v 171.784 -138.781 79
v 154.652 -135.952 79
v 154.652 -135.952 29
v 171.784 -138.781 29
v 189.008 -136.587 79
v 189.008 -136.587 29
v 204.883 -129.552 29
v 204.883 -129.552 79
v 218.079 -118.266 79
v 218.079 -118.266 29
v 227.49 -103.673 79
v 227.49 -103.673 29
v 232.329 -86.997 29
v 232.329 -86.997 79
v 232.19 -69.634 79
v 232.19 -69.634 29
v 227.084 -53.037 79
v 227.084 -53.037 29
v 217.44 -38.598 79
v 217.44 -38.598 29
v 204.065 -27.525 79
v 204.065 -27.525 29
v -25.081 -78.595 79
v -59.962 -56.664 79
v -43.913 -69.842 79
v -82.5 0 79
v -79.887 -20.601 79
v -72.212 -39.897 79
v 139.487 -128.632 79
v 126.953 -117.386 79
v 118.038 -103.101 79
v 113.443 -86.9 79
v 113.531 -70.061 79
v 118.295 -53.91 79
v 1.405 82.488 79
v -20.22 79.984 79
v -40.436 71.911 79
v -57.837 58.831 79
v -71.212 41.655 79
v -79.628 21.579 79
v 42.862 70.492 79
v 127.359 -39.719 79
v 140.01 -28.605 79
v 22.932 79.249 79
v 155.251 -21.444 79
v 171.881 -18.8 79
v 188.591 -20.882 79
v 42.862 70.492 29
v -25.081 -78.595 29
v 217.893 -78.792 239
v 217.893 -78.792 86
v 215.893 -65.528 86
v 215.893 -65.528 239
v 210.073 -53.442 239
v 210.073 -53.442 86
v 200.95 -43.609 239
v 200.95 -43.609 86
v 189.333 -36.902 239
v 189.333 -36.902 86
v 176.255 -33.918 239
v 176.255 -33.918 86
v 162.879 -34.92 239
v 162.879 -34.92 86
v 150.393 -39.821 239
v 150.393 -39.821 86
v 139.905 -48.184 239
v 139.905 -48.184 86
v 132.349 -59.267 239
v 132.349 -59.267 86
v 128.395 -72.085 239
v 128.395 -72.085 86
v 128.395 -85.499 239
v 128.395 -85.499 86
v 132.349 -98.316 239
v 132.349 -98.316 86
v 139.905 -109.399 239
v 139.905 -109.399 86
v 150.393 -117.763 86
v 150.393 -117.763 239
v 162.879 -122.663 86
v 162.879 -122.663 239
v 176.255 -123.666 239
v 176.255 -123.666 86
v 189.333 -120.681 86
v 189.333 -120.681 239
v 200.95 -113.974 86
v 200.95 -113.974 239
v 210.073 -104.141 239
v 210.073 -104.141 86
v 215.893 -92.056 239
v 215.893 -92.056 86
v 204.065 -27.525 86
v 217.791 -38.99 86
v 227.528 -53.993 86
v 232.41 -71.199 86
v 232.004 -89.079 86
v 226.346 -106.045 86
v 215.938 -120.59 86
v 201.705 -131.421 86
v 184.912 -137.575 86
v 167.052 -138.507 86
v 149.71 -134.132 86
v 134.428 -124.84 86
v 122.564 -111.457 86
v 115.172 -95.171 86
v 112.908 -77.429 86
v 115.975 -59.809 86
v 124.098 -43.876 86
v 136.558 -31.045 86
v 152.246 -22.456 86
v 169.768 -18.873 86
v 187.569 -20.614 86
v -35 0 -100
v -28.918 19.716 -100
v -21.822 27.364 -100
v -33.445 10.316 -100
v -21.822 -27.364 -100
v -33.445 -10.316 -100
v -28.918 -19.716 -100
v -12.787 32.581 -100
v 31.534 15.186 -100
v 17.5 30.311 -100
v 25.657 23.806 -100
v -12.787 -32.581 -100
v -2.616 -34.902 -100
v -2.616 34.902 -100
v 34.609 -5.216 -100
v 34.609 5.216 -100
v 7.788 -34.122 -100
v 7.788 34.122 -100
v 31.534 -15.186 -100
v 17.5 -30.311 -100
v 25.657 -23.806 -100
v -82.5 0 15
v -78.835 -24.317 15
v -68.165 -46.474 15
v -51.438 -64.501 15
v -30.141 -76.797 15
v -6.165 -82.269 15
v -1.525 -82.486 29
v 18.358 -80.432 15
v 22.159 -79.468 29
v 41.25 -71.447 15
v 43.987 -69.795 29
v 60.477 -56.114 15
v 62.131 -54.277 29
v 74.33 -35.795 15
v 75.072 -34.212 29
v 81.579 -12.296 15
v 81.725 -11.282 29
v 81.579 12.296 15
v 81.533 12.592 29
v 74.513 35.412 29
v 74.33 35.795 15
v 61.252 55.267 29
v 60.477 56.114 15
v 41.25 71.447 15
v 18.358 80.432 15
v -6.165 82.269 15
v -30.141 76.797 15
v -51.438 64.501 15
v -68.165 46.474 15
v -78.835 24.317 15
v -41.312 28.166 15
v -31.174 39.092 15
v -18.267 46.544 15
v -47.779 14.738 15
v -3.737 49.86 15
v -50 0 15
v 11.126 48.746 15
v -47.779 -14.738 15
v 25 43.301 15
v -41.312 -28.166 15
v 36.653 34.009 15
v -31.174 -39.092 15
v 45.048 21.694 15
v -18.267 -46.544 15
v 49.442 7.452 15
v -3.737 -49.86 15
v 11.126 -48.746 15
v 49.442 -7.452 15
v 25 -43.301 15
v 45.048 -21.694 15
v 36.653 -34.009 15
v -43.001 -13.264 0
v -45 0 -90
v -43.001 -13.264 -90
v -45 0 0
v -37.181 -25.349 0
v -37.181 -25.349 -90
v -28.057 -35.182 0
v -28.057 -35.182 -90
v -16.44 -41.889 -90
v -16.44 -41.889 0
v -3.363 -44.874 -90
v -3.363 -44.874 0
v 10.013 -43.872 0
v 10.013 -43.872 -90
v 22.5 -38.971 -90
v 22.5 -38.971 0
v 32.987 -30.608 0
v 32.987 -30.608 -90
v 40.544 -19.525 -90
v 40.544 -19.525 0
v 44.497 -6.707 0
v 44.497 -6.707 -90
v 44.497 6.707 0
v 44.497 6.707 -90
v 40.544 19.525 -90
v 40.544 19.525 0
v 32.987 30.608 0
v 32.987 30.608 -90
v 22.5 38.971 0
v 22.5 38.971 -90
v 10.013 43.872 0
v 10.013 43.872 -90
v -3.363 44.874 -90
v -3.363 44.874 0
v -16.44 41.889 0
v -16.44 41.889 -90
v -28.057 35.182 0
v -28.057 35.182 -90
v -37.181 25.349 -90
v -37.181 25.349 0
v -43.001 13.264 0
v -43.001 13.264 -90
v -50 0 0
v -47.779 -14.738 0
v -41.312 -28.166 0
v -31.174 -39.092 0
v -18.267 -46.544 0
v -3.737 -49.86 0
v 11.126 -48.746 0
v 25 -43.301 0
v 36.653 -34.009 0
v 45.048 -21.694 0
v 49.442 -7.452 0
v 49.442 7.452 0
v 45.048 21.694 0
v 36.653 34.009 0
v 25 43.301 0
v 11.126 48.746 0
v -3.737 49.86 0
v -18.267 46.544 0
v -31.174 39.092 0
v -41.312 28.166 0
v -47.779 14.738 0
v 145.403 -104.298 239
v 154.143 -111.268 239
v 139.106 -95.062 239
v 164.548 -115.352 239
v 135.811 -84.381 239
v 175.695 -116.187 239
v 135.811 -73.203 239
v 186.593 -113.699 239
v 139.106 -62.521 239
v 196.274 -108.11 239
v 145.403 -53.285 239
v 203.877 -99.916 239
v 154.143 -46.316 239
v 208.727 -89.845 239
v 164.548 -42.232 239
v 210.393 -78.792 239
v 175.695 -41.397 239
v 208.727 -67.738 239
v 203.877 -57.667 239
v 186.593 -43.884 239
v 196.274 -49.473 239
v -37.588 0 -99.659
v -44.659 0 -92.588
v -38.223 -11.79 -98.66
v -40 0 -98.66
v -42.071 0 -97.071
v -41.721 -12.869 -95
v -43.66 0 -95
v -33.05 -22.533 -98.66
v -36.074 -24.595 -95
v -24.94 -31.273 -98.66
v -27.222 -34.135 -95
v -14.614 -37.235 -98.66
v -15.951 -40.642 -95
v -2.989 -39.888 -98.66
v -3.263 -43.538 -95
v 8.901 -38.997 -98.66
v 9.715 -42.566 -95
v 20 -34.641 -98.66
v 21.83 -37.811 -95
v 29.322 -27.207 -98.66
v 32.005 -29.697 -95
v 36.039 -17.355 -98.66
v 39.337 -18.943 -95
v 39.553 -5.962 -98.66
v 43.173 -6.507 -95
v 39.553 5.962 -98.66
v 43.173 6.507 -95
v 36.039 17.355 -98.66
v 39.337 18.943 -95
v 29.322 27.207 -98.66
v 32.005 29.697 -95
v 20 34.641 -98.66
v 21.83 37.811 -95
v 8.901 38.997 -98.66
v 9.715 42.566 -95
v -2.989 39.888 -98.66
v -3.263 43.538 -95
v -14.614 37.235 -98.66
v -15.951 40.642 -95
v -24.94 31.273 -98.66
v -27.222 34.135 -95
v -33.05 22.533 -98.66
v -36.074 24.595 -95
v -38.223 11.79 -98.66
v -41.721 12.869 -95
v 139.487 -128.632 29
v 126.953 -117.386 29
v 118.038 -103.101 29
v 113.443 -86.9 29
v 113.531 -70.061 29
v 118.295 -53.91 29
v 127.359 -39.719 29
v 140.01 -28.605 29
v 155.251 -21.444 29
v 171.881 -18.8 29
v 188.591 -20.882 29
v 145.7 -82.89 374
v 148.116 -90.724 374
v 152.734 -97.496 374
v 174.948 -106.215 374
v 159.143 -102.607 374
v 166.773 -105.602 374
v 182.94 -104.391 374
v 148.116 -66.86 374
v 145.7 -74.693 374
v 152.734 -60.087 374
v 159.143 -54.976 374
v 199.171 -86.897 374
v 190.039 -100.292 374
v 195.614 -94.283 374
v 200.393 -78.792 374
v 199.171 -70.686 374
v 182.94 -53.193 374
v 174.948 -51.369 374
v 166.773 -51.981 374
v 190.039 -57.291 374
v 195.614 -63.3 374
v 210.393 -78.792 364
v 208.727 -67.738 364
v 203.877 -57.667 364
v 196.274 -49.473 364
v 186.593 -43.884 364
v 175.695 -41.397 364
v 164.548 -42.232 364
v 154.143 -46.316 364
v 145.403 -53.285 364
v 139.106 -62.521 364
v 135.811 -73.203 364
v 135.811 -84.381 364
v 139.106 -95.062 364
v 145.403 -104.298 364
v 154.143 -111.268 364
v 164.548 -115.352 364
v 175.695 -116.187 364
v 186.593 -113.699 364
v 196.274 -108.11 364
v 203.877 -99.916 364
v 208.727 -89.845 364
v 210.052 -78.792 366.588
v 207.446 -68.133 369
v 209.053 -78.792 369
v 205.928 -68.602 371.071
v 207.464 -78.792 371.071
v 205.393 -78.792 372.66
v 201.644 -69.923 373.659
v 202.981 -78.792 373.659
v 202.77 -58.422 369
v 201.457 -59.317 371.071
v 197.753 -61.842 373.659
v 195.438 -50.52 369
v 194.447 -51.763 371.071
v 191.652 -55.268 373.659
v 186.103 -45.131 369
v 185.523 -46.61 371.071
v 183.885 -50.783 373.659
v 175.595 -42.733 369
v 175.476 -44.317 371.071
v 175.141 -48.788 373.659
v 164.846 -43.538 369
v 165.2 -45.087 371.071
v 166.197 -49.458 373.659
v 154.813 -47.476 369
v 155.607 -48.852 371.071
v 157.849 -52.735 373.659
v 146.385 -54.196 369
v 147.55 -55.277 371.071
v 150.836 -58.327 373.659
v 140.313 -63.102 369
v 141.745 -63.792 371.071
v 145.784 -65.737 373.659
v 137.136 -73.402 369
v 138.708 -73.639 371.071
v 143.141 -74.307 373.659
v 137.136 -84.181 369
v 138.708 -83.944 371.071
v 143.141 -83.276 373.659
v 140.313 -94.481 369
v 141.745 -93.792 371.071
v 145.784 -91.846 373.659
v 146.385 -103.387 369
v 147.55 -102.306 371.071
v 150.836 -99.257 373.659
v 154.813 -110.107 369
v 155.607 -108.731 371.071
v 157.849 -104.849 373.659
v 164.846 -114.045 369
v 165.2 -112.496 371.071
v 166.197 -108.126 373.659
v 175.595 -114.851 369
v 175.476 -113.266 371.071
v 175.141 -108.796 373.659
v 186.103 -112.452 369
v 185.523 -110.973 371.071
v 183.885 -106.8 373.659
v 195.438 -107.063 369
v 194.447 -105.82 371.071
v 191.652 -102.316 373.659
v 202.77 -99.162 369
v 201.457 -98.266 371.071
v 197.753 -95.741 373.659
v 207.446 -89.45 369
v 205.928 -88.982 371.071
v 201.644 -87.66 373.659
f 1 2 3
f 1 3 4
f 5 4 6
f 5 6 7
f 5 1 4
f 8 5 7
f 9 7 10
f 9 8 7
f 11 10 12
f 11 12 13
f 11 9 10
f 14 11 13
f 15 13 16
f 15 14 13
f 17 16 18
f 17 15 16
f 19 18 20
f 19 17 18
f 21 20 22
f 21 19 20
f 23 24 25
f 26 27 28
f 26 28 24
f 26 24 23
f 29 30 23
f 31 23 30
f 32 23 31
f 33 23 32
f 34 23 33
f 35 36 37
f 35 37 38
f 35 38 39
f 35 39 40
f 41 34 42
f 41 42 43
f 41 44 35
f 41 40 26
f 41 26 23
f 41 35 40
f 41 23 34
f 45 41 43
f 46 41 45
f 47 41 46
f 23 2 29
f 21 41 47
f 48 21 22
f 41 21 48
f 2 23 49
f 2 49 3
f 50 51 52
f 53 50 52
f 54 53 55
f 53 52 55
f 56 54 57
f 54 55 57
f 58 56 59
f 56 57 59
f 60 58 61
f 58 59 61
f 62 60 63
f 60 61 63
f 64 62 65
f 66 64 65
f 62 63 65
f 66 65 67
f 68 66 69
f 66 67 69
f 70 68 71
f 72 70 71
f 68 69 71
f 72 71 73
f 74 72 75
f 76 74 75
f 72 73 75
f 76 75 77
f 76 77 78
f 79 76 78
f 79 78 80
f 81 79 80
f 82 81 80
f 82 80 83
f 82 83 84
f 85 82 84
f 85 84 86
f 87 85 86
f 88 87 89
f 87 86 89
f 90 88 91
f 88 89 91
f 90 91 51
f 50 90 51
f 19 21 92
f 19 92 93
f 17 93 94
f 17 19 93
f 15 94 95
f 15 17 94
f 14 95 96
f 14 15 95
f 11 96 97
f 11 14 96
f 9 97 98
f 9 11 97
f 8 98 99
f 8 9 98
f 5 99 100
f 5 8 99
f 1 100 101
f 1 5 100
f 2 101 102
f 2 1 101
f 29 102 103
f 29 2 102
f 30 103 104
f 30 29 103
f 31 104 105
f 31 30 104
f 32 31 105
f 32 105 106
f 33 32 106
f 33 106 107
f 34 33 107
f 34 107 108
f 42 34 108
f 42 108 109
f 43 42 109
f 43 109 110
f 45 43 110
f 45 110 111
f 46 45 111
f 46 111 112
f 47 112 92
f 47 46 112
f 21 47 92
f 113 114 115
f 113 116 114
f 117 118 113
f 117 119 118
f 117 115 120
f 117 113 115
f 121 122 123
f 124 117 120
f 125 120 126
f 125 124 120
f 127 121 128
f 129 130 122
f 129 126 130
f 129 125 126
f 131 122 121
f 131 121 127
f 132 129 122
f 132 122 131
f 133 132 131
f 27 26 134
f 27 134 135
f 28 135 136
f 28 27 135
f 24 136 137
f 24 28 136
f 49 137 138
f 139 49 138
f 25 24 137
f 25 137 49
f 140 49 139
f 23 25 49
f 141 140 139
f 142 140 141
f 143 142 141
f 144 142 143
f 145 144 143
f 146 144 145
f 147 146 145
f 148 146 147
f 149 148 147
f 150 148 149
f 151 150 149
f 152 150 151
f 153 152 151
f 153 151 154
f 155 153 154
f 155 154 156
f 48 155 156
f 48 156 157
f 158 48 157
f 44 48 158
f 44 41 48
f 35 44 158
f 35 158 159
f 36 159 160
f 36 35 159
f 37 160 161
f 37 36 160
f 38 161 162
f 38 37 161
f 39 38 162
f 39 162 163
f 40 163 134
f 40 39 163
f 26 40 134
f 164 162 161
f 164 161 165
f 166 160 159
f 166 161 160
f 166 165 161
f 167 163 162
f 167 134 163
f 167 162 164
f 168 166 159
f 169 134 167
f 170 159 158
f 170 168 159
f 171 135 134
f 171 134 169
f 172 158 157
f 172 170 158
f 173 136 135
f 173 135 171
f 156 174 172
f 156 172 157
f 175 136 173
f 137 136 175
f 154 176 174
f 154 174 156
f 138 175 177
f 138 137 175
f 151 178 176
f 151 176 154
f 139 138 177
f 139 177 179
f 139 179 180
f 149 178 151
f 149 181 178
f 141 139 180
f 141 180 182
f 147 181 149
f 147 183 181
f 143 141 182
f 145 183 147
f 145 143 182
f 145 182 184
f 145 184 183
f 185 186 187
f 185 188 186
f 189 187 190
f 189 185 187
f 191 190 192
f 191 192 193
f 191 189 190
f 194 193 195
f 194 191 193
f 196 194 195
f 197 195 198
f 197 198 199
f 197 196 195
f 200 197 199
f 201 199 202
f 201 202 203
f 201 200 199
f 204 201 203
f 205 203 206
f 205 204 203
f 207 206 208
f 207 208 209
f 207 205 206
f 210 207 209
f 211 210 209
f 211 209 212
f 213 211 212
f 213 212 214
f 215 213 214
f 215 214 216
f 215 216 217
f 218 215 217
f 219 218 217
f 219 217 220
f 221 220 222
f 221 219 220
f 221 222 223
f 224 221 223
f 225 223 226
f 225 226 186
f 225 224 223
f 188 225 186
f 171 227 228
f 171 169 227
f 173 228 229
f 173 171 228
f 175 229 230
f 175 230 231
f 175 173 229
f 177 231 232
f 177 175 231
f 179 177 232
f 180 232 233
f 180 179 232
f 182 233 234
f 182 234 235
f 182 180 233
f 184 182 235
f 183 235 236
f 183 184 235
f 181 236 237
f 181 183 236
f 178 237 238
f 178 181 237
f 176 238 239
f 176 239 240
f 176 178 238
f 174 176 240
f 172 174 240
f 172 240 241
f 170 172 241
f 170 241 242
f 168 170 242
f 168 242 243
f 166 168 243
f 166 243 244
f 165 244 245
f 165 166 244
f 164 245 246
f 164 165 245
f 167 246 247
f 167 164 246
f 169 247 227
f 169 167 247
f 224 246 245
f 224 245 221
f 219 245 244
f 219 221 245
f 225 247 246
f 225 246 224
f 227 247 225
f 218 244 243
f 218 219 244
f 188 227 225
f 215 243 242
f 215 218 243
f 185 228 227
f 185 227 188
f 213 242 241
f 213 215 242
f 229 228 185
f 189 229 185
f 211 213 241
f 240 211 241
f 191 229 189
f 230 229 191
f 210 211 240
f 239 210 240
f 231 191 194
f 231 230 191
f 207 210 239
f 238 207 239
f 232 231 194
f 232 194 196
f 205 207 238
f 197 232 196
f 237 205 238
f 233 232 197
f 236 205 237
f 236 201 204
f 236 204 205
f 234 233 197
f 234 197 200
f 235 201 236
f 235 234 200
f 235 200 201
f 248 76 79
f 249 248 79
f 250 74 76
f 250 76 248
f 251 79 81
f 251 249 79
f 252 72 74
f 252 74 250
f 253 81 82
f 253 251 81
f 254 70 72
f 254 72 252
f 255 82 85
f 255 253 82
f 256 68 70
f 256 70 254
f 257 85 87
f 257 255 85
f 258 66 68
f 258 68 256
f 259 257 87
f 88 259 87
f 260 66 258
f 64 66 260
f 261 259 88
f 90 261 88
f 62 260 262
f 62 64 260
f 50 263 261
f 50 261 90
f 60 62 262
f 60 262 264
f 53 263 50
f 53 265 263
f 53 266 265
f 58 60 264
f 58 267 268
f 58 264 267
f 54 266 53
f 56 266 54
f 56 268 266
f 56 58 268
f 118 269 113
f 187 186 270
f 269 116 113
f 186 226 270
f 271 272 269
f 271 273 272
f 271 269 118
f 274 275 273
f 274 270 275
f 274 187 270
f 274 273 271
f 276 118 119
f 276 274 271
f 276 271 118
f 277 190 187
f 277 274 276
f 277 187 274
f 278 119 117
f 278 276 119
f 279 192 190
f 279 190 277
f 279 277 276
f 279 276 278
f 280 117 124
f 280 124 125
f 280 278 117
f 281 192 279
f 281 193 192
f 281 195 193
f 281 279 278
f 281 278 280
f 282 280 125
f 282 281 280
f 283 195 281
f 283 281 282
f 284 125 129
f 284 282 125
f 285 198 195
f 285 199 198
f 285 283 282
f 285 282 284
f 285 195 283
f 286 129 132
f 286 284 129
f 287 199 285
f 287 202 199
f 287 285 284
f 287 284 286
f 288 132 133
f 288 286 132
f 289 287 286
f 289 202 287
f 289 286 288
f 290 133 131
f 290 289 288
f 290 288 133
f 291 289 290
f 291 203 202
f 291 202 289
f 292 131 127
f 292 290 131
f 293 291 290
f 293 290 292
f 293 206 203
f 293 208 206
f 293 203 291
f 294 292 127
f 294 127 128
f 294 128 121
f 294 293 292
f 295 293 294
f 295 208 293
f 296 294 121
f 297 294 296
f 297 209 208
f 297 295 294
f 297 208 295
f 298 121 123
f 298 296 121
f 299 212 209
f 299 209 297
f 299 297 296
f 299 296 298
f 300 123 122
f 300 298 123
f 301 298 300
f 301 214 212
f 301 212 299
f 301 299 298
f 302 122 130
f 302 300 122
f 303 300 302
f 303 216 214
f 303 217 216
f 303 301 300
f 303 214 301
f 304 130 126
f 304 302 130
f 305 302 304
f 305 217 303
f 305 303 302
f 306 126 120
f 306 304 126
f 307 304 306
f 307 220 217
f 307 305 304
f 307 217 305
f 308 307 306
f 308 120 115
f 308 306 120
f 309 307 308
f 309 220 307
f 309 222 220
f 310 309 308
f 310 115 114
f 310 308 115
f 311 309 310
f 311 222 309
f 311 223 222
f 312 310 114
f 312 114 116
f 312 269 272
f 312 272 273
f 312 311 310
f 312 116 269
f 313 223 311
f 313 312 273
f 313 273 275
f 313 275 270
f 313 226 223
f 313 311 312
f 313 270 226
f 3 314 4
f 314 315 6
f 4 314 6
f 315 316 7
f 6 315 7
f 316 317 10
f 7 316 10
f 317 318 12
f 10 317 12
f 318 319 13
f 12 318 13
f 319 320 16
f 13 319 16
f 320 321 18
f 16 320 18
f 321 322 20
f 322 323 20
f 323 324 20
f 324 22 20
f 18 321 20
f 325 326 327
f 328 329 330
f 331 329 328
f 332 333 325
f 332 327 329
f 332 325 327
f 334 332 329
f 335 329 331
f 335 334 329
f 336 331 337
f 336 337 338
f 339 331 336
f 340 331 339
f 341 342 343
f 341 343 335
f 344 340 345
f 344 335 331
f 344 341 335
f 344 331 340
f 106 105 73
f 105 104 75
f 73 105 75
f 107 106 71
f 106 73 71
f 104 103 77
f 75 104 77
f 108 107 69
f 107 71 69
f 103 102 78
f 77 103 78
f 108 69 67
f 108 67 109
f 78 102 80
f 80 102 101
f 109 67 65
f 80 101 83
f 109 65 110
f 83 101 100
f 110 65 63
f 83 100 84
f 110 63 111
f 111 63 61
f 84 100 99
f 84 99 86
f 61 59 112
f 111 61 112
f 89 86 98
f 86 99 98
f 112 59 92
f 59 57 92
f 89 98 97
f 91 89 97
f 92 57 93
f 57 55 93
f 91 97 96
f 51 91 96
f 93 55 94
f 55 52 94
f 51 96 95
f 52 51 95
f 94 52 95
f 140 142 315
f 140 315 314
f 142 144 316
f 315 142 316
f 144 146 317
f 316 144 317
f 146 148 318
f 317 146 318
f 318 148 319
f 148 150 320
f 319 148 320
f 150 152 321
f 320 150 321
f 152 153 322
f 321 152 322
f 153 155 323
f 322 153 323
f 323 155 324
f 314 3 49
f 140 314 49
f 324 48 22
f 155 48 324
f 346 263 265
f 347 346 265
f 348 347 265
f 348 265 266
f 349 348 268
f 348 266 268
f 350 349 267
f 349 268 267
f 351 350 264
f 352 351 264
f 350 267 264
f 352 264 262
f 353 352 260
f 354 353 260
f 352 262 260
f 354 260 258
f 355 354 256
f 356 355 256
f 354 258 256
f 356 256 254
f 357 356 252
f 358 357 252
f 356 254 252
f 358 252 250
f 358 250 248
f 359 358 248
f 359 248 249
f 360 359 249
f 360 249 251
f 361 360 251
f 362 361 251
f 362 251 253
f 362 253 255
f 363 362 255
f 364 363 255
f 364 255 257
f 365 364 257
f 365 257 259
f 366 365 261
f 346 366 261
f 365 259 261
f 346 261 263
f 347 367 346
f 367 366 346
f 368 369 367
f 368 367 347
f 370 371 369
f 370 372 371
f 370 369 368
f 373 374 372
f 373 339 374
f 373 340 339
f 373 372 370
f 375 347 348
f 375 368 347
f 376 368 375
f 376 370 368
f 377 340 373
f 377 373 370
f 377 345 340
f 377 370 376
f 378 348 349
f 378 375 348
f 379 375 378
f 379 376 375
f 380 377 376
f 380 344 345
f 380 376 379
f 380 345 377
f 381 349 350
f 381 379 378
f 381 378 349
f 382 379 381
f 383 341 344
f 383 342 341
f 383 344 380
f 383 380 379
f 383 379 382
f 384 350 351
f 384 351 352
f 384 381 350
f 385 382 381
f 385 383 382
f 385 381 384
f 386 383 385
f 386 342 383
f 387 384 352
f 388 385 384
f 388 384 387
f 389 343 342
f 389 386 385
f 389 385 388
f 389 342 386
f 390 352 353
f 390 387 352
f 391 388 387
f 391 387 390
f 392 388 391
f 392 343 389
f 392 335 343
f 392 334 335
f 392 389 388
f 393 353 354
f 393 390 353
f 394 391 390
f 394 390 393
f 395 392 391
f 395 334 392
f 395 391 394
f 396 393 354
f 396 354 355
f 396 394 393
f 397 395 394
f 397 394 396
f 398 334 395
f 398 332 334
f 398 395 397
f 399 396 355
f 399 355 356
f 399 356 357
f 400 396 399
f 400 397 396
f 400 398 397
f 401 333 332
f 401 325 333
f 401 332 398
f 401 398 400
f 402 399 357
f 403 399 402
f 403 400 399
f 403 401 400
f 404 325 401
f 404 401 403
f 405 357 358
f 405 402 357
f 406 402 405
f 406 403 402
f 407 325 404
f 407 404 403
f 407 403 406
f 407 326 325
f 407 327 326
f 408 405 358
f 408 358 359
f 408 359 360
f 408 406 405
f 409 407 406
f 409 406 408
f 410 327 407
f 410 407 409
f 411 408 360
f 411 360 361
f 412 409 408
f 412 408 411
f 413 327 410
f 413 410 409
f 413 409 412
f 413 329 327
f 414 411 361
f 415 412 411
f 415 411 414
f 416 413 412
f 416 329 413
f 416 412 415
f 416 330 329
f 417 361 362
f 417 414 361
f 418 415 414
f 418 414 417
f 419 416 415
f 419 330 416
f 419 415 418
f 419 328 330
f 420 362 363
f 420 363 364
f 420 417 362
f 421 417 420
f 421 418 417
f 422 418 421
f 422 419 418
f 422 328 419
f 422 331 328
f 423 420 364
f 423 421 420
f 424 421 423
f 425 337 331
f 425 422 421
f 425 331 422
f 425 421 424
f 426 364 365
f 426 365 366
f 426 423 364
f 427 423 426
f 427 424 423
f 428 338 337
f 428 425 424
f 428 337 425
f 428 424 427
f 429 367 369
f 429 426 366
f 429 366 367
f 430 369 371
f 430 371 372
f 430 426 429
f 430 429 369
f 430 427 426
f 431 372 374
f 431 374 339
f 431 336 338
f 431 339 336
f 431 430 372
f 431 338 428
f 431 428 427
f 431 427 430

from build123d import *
from build123d.topology import SkipClean

# Parameters (mm, degrees)
Y_KSEKLIK_EKSTR_ZYON1_DEPTH = 50
IZIM4_R                     = 60
Y_KSEKLIK_EKSTR_ZYON2_DEPTH = 57
IZIM5_R                     = 45
Y_KSEKLIK_EKSTR_ZYON3_DEPTH = 153
IZIM6_R                     = 37.5
Y_KSEKLIK_EKSTR_ZYON4_DEPTH = 135
RADYUS1_R                   = 10


with BuildPart() as part:
    # Çizim1 → Döndür1 (revolve)
    with BuildSketch(Plane(origin=(0, 0, 0), x_dir=(0, 0, -1), z_dir=(1, 0, 0)), mode=Mode.PRIVATE) as d_nd_r1_sk:
        with BuildLine():
            Line((0, 0), (100, 0))
            Line((100, 0), (100, 35))
            ThreePointArc((100, 35), (97.071067812, 42.071067812), (90, 45))
            Line((90, 45), (0, 45))
            Line((0, 45), (0, 0))
        make_face()
        Polygon((-15, 0), (0, 0), (0, 45), (0, 50), (-15, 50), align=None)
        Polygon((-79, 0), (-15, 0), (-15, 50), (-15, 82.5), (-79, 82.5), align=None)
    revolve(d_nd_r1_sk.sketch.rotate(Axis((0, 0, -100), (0, 0, 1)), 90), axis=Axis((0, 0, -100), (0, 0, 1)))

    # Çizim2 → Yükseklik-Ekstrüzyon1 (add)
    with BuildSketch(Plane.XY.offset(79)):
        with BuildLine():
            Line((204.064670252, -27.524722616), (42.86153958, 70.492116048))
            Line((42.86153958, 70.492116048), (-25.081375274, -78.595003749))
            Line((-25.081375274, -78.595003749), (154.651641268, -135.951718832))
            ThreePointArc((154.651641268, -135.951718832), (227.490317719, -103.673310664), (204.064670252, -27.524722616))
        make_face()
    extrude(amount=-Y_KSEKLIK_EKSTR_ZYON1_DEPTH)

    # Çizim4 → Yükseklik-Ekstrüzyon2 (add)
    with SkipClean():  # the faces are left unmerged after this step: merging them gives an invalid solid
        with BuildSketch(Plane(origin=(0, 0, 29), x_dir=(-1, 0, 0), z_dir=(0, 0, -1))):
            with Locations(Location((-172.892641467, -78.791716105, 0), (0, 0, 121.300985795))):
                Circle(IZIM4_R)
        extrude(amount=-Y_KSEKLIK_EKSTR_ZYON2_DEPTH)

    # Çizim5 → Yükseklik-Ekstrüzyon3 (add)
    with SkipClean():  # the faces are left unmerged after this step: merging them gives an invalid solid
        with BuildSketch(Plane.XY.offset(86)):
            with Locations((172.892641467, -78.791716105)):
                Circle(IZIM5_R)
        extrude(amount=Y_KSEKLIK_EKSTR_ZYON3_DEPTH)

    # Çizim6 → Yükseklik-Ekstrüzyon4 (add)
    with SkipClean():  # the faces are left unmerged after this step: merging them gives an invalid solid
        with BuildSketch(Plane.XY.offset(239)):
            with Locations((172.892641467, -78.791716105)):
                Circle(IZIM6_R)
        extrude(amount=Y_KSEKLIK_EKSTR_ZYON4_DEPTH)

    # Radyus1
    radyus1_edges = [part.edges().sort_by_distance(p)[0] for p in [
        (135.392641467, -78.791716105, 374),
    ]]
    fillet(radyus1_edges, radius=RADYUS1_R)


solid = part.part
